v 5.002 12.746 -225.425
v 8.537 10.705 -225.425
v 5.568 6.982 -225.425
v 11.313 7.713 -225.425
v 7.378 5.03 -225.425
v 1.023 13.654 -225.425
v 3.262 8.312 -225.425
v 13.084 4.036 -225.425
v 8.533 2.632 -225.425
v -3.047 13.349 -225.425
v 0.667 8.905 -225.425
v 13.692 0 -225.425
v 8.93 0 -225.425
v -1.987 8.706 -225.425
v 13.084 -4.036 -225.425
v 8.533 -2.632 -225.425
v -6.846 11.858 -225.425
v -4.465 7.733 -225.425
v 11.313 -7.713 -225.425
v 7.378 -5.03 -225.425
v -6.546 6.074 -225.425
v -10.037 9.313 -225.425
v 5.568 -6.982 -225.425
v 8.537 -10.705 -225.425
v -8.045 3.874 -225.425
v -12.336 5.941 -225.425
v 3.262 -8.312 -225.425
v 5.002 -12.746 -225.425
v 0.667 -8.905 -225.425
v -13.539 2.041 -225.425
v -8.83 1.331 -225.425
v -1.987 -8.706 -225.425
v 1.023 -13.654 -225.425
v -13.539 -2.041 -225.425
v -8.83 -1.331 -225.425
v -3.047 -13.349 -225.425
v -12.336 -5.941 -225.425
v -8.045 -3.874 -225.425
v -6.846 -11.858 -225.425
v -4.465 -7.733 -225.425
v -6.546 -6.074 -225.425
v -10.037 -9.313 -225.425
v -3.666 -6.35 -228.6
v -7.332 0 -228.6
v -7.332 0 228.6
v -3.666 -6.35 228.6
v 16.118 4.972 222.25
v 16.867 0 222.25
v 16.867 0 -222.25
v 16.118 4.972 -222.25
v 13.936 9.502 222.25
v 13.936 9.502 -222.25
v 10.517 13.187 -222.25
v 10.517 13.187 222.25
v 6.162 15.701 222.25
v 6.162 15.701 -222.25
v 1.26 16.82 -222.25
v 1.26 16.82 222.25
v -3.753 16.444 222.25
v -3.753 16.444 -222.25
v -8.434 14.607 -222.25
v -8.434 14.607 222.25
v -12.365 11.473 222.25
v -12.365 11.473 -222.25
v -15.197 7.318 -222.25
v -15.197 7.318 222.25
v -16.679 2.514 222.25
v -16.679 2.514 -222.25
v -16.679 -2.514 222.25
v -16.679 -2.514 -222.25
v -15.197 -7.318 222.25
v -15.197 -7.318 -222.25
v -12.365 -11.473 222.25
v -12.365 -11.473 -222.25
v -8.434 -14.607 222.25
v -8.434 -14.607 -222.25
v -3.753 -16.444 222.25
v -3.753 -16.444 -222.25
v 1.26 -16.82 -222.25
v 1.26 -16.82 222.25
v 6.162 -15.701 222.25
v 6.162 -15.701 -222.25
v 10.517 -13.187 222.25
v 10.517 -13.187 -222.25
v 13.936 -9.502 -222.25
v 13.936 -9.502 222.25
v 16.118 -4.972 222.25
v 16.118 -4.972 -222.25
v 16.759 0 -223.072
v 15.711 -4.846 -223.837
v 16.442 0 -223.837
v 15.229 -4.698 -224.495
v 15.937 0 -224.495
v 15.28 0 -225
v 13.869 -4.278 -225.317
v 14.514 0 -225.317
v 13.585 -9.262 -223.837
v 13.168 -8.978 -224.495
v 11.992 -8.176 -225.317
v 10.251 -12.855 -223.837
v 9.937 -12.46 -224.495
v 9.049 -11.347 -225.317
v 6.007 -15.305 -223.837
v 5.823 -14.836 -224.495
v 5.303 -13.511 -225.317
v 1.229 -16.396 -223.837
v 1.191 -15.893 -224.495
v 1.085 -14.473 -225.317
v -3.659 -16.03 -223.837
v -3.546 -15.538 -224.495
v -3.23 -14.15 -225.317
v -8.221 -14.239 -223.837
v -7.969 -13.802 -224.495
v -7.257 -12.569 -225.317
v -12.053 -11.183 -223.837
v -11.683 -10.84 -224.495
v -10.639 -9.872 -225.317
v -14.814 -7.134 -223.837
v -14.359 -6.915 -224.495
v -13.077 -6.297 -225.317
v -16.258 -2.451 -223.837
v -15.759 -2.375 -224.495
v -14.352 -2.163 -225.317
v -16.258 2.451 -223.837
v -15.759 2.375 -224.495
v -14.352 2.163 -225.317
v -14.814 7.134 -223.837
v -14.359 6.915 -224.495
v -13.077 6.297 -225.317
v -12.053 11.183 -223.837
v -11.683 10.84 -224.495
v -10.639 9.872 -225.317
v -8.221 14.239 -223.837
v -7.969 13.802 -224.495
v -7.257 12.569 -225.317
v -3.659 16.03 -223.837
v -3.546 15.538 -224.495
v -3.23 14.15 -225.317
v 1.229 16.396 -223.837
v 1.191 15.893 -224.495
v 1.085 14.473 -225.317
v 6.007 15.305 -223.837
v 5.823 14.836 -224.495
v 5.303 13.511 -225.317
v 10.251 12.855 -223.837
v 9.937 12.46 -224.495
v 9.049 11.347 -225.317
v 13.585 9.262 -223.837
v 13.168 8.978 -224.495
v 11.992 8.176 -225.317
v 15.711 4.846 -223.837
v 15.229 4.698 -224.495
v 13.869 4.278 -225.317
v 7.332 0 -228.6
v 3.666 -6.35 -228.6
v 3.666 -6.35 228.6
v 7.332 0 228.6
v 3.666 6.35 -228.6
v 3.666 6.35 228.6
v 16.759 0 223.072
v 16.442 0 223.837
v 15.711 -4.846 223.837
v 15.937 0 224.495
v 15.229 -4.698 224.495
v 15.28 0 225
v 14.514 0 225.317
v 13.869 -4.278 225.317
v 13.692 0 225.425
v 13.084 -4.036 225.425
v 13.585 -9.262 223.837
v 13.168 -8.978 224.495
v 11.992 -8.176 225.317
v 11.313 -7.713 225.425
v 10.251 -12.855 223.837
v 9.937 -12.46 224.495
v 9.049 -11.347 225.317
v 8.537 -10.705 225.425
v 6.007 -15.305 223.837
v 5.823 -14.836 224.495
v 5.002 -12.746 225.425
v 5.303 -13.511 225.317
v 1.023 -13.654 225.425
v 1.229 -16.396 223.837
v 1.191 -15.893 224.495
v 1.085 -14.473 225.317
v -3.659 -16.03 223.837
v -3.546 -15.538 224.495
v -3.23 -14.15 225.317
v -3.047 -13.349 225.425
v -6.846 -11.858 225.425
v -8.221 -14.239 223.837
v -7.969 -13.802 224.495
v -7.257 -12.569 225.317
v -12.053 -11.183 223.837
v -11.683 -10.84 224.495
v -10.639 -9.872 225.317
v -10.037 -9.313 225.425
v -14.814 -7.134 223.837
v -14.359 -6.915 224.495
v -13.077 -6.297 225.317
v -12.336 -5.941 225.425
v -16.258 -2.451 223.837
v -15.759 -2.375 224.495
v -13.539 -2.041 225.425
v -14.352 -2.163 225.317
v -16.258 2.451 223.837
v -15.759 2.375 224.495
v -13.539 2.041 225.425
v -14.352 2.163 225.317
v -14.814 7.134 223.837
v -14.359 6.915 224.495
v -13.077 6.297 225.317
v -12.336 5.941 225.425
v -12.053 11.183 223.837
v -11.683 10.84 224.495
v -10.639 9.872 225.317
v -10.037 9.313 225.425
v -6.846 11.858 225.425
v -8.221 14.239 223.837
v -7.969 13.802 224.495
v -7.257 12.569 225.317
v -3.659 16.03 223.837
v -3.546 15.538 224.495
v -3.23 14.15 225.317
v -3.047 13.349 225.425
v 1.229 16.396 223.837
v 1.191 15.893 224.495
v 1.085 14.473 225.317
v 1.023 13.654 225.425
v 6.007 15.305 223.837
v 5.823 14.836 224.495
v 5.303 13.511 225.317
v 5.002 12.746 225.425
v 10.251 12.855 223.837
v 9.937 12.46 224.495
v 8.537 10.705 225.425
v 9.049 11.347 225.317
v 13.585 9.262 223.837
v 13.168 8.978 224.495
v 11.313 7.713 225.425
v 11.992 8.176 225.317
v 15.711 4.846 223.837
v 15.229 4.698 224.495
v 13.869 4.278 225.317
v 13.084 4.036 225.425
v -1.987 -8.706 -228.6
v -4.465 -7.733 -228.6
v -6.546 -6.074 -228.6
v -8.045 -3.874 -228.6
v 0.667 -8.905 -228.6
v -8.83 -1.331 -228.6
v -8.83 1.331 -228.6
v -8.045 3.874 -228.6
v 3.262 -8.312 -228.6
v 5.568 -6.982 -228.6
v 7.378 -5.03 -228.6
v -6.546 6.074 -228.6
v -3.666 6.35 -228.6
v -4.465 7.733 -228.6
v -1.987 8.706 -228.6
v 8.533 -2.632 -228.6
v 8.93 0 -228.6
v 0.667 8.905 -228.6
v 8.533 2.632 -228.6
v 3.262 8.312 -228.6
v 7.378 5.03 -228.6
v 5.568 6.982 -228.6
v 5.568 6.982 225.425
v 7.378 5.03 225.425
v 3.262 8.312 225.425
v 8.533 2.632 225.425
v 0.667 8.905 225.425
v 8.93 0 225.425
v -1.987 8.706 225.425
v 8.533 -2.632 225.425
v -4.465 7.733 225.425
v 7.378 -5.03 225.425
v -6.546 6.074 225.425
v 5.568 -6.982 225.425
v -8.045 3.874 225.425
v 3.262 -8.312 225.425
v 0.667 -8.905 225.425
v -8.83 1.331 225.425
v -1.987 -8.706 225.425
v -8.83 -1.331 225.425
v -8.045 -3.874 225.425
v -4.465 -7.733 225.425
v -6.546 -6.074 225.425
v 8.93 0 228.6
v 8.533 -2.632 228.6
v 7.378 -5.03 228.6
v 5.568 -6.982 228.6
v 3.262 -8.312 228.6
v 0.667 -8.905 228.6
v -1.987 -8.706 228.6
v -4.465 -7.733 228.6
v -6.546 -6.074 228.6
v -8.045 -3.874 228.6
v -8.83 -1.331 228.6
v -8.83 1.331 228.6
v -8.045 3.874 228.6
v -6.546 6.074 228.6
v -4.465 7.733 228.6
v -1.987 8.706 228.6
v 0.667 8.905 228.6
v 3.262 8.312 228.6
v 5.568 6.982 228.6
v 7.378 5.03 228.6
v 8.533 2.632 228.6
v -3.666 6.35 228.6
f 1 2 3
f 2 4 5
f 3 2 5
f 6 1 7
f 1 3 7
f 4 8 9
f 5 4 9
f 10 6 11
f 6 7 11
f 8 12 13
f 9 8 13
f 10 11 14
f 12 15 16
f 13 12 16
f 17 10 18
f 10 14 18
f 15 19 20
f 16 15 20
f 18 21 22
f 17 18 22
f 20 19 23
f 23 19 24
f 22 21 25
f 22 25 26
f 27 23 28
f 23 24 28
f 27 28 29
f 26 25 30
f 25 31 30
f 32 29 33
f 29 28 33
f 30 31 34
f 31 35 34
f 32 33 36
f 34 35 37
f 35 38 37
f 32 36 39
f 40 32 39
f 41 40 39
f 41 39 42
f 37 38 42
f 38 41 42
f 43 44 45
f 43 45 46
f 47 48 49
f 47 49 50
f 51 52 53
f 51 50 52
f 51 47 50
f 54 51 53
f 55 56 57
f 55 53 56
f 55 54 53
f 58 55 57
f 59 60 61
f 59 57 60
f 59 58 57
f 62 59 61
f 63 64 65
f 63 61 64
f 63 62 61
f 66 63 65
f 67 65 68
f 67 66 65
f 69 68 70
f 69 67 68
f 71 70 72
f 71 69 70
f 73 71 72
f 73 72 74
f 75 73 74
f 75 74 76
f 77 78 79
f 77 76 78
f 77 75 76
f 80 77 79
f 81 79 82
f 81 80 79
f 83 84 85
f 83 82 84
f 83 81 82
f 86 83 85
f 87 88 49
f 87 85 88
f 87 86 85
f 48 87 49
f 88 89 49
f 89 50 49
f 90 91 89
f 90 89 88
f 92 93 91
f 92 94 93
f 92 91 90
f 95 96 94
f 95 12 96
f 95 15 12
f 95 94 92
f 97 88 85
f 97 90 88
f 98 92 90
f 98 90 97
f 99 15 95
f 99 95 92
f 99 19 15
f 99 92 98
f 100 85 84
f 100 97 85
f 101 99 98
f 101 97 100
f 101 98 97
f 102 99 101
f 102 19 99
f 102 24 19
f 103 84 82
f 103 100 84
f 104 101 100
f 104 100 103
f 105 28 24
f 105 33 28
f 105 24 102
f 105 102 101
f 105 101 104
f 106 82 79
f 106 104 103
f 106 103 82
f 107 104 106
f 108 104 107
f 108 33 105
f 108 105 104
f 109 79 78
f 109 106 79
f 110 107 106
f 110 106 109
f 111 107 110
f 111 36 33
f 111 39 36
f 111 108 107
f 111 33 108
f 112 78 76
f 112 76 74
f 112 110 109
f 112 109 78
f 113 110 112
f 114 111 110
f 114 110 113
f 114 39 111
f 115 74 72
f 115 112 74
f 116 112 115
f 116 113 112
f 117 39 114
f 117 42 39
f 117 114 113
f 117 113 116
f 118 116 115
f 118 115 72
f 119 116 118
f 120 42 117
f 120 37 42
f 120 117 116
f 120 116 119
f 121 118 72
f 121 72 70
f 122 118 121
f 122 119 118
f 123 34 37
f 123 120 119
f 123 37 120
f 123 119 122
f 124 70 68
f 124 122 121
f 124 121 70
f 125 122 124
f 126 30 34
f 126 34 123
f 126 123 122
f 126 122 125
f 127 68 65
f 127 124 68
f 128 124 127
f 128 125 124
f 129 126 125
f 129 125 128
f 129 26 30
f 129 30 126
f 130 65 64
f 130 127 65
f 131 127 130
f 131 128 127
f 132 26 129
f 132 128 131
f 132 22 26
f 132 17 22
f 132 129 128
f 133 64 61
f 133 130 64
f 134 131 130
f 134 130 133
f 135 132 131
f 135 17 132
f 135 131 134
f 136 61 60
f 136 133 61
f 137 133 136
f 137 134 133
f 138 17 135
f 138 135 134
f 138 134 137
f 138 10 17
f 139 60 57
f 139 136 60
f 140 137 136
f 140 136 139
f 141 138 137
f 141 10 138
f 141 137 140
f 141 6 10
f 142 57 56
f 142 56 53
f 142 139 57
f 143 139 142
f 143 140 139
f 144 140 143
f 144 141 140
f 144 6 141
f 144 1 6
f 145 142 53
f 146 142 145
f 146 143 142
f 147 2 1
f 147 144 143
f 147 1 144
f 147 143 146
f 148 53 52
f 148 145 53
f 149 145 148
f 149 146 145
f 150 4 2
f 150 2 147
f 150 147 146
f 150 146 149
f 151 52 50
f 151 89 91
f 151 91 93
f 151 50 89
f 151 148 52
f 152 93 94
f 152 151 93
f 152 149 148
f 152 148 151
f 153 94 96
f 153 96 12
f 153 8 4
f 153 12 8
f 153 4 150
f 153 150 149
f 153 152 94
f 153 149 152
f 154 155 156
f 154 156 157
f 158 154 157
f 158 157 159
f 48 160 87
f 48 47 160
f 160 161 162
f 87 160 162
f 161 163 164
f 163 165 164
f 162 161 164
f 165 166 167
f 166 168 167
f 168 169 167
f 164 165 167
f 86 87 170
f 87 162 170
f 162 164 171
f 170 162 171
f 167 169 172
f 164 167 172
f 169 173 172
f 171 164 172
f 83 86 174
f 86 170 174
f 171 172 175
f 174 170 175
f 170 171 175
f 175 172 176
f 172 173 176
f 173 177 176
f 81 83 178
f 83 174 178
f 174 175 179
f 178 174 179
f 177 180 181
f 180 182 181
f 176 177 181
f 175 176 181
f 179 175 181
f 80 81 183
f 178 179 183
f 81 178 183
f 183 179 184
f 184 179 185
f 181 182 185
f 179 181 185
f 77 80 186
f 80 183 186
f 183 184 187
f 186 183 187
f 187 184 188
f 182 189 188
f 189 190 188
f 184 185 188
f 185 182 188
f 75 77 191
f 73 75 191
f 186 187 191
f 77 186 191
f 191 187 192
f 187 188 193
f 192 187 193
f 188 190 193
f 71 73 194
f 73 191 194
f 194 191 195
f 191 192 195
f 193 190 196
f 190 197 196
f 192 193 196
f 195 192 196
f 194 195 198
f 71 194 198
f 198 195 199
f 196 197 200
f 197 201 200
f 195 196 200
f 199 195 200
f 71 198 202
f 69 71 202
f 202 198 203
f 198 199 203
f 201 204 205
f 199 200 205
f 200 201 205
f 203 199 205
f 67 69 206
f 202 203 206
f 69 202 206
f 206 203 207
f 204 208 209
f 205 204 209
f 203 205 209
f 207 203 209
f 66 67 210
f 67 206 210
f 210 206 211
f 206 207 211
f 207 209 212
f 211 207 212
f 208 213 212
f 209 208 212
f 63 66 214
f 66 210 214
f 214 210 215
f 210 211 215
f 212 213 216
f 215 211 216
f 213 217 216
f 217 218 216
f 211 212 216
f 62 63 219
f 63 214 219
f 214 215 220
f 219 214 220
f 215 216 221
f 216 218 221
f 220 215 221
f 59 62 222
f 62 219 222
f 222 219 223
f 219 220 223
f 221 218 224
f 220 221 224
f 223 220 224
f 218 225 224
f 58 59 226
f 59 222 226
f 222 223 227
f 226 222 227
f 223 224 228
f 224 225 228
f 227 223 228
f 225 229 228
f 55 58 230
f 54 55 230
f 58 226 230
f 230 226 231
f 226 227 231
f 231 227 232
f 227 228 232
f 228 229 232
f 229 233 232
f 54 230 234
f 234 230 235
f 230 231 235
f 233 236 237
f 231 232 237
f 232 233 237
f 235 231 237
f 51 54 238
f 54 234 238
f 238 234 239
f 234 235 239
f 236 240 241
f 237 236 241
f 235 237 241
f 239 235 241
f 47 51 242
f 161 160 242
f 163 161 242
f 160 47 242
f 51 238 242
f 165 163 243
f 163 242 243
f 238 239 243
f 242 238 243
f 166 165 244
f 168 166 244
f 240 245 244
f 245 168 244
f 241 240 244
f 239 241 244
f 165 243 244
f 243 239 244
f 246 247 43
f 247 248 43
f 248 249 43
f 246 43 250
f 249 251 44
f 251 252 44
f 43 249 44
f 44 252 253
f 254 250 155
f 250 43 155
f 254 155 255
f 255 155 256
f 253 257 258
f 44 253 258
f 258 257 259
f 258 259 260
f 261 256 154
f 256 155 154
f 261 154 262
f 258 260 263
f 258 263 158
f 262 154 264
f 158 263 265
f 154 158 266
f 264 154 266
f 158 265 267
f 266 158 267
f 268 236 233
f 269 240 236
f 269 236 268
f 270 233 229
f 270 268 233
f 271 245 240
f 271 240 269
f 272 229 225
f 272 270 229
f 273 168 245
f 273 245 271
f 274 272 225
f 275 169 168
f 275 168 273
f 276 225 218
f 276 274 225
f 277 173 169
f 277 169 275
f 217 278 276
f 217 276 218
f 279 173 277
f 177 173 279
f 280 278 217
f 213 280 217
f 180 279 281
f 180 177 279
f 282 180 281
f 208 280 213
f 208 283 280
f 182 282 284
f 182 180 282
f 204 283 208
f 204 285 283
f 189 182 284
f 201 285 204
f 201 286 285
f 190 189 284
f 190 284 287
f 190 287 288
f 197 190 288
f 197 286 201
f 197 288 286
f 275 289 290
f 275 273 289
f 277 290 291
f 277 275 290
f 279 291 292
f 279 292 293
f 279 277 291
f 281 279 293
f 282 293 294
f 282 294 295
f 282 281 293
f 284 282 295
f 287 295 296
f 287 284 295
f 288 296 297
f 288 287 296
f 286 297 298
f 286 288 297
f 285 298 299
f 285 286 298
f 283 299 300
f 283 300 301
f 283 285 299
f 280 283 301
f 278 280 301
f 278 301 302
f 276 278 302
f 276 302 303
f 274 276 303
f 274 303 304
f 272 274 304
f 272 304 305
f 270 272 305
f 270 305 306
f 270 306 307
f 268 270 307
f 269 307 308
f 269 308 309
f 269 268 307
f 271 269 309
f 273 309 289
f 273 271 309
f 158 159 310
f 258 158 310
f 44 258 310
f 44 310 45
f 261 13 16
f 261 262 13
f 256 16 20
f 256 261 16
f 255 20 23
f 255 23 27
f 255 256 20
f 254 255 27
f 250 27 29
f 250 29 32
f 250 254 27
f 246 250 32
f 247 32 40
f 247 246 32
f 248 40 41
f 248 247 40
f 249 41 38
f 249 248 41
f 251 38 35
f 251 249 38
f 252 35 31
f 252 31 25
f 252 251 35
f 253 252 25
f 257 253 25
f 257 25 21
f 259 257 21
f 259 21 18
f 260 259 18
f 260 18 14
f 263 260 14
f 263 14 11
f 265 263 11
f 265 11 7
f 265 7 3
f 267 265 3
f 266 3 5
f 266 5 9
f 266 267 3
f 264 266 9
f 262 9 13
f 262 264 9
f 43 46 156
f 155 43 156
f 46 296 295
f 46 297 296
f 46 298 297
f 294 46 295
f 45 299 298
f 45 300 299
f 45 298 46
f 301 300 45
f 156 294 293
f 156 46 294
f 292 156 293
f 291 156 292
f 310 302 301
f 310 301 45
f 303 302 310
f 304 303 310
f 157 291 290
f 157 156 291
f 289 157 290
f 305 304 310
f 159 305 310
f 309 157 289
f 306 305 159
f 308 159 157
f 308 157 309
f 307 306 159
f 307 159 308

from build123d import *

# Parameters (mm, degrees)
SKETCH1_R           = 16.8671875
BOSS_EXTRUDE1_DEPTH = 228.6
SKETCH2_W           = 7.9375
SKETCH2_H           = 3.175
FILLET1_R           = 3.175
CUT_EXTRUDE1_DEPTH  = 458.821847482


with BuildPart() as part:
    # Sketch1 → Boss-Extrude1 (new, symmetric)
    with BuildSketch(Plane.XY):
        Circle(SKETCH1_R)
    extrude(amount=BOSS_EXTRUDE1_DEPTH, both=True)

    # Sketch2 → Cut-Revolve1 (revolve, cut)
    with BuildSketch(Plane(origin=(0, 0, 0), x_dir=(1, 0, 0), z_dir=(0, 1, 0))):
        with Locations((12.8984375, -227.0125)):
            Rectangle(SKETCH2_W, SKETCH2_H)
        with Locations((12.8984375, 227.0125)):
            Rectangle(SKETCH2_W, SKETCH2_H)
    revolve(axis=Axis((0, 0, 0), (0, 0, -1)), mode=Mode.SUBTRACT)

    # Fillet1
    fillet1_edges = [part.edges().sort_by_distance(p)[0] for p in [
        (-16.8671875, 0, -225.425),
        (-16.8671875, 0, 225.425),
    ]]
    fillet(fillet1_edges, radius=FILLET1_R)

    # Sketch3 → Cut-Extrude1 (cut, through all)
    with BuildSketch(Plane.XY.offset(228.6)):
        Polygon((7.332348419, 0), (3.666174209, 6.35), (-3.666174209, 6.35), (-7.332348419, 0), (-3.666174209, -6.35), (3.666174209, -6.35), align=None)
    extrude(amount=-CUT_EXTRUDE1_DEPTH, mode=Mode.SUBTRACT)


solid = part.part
